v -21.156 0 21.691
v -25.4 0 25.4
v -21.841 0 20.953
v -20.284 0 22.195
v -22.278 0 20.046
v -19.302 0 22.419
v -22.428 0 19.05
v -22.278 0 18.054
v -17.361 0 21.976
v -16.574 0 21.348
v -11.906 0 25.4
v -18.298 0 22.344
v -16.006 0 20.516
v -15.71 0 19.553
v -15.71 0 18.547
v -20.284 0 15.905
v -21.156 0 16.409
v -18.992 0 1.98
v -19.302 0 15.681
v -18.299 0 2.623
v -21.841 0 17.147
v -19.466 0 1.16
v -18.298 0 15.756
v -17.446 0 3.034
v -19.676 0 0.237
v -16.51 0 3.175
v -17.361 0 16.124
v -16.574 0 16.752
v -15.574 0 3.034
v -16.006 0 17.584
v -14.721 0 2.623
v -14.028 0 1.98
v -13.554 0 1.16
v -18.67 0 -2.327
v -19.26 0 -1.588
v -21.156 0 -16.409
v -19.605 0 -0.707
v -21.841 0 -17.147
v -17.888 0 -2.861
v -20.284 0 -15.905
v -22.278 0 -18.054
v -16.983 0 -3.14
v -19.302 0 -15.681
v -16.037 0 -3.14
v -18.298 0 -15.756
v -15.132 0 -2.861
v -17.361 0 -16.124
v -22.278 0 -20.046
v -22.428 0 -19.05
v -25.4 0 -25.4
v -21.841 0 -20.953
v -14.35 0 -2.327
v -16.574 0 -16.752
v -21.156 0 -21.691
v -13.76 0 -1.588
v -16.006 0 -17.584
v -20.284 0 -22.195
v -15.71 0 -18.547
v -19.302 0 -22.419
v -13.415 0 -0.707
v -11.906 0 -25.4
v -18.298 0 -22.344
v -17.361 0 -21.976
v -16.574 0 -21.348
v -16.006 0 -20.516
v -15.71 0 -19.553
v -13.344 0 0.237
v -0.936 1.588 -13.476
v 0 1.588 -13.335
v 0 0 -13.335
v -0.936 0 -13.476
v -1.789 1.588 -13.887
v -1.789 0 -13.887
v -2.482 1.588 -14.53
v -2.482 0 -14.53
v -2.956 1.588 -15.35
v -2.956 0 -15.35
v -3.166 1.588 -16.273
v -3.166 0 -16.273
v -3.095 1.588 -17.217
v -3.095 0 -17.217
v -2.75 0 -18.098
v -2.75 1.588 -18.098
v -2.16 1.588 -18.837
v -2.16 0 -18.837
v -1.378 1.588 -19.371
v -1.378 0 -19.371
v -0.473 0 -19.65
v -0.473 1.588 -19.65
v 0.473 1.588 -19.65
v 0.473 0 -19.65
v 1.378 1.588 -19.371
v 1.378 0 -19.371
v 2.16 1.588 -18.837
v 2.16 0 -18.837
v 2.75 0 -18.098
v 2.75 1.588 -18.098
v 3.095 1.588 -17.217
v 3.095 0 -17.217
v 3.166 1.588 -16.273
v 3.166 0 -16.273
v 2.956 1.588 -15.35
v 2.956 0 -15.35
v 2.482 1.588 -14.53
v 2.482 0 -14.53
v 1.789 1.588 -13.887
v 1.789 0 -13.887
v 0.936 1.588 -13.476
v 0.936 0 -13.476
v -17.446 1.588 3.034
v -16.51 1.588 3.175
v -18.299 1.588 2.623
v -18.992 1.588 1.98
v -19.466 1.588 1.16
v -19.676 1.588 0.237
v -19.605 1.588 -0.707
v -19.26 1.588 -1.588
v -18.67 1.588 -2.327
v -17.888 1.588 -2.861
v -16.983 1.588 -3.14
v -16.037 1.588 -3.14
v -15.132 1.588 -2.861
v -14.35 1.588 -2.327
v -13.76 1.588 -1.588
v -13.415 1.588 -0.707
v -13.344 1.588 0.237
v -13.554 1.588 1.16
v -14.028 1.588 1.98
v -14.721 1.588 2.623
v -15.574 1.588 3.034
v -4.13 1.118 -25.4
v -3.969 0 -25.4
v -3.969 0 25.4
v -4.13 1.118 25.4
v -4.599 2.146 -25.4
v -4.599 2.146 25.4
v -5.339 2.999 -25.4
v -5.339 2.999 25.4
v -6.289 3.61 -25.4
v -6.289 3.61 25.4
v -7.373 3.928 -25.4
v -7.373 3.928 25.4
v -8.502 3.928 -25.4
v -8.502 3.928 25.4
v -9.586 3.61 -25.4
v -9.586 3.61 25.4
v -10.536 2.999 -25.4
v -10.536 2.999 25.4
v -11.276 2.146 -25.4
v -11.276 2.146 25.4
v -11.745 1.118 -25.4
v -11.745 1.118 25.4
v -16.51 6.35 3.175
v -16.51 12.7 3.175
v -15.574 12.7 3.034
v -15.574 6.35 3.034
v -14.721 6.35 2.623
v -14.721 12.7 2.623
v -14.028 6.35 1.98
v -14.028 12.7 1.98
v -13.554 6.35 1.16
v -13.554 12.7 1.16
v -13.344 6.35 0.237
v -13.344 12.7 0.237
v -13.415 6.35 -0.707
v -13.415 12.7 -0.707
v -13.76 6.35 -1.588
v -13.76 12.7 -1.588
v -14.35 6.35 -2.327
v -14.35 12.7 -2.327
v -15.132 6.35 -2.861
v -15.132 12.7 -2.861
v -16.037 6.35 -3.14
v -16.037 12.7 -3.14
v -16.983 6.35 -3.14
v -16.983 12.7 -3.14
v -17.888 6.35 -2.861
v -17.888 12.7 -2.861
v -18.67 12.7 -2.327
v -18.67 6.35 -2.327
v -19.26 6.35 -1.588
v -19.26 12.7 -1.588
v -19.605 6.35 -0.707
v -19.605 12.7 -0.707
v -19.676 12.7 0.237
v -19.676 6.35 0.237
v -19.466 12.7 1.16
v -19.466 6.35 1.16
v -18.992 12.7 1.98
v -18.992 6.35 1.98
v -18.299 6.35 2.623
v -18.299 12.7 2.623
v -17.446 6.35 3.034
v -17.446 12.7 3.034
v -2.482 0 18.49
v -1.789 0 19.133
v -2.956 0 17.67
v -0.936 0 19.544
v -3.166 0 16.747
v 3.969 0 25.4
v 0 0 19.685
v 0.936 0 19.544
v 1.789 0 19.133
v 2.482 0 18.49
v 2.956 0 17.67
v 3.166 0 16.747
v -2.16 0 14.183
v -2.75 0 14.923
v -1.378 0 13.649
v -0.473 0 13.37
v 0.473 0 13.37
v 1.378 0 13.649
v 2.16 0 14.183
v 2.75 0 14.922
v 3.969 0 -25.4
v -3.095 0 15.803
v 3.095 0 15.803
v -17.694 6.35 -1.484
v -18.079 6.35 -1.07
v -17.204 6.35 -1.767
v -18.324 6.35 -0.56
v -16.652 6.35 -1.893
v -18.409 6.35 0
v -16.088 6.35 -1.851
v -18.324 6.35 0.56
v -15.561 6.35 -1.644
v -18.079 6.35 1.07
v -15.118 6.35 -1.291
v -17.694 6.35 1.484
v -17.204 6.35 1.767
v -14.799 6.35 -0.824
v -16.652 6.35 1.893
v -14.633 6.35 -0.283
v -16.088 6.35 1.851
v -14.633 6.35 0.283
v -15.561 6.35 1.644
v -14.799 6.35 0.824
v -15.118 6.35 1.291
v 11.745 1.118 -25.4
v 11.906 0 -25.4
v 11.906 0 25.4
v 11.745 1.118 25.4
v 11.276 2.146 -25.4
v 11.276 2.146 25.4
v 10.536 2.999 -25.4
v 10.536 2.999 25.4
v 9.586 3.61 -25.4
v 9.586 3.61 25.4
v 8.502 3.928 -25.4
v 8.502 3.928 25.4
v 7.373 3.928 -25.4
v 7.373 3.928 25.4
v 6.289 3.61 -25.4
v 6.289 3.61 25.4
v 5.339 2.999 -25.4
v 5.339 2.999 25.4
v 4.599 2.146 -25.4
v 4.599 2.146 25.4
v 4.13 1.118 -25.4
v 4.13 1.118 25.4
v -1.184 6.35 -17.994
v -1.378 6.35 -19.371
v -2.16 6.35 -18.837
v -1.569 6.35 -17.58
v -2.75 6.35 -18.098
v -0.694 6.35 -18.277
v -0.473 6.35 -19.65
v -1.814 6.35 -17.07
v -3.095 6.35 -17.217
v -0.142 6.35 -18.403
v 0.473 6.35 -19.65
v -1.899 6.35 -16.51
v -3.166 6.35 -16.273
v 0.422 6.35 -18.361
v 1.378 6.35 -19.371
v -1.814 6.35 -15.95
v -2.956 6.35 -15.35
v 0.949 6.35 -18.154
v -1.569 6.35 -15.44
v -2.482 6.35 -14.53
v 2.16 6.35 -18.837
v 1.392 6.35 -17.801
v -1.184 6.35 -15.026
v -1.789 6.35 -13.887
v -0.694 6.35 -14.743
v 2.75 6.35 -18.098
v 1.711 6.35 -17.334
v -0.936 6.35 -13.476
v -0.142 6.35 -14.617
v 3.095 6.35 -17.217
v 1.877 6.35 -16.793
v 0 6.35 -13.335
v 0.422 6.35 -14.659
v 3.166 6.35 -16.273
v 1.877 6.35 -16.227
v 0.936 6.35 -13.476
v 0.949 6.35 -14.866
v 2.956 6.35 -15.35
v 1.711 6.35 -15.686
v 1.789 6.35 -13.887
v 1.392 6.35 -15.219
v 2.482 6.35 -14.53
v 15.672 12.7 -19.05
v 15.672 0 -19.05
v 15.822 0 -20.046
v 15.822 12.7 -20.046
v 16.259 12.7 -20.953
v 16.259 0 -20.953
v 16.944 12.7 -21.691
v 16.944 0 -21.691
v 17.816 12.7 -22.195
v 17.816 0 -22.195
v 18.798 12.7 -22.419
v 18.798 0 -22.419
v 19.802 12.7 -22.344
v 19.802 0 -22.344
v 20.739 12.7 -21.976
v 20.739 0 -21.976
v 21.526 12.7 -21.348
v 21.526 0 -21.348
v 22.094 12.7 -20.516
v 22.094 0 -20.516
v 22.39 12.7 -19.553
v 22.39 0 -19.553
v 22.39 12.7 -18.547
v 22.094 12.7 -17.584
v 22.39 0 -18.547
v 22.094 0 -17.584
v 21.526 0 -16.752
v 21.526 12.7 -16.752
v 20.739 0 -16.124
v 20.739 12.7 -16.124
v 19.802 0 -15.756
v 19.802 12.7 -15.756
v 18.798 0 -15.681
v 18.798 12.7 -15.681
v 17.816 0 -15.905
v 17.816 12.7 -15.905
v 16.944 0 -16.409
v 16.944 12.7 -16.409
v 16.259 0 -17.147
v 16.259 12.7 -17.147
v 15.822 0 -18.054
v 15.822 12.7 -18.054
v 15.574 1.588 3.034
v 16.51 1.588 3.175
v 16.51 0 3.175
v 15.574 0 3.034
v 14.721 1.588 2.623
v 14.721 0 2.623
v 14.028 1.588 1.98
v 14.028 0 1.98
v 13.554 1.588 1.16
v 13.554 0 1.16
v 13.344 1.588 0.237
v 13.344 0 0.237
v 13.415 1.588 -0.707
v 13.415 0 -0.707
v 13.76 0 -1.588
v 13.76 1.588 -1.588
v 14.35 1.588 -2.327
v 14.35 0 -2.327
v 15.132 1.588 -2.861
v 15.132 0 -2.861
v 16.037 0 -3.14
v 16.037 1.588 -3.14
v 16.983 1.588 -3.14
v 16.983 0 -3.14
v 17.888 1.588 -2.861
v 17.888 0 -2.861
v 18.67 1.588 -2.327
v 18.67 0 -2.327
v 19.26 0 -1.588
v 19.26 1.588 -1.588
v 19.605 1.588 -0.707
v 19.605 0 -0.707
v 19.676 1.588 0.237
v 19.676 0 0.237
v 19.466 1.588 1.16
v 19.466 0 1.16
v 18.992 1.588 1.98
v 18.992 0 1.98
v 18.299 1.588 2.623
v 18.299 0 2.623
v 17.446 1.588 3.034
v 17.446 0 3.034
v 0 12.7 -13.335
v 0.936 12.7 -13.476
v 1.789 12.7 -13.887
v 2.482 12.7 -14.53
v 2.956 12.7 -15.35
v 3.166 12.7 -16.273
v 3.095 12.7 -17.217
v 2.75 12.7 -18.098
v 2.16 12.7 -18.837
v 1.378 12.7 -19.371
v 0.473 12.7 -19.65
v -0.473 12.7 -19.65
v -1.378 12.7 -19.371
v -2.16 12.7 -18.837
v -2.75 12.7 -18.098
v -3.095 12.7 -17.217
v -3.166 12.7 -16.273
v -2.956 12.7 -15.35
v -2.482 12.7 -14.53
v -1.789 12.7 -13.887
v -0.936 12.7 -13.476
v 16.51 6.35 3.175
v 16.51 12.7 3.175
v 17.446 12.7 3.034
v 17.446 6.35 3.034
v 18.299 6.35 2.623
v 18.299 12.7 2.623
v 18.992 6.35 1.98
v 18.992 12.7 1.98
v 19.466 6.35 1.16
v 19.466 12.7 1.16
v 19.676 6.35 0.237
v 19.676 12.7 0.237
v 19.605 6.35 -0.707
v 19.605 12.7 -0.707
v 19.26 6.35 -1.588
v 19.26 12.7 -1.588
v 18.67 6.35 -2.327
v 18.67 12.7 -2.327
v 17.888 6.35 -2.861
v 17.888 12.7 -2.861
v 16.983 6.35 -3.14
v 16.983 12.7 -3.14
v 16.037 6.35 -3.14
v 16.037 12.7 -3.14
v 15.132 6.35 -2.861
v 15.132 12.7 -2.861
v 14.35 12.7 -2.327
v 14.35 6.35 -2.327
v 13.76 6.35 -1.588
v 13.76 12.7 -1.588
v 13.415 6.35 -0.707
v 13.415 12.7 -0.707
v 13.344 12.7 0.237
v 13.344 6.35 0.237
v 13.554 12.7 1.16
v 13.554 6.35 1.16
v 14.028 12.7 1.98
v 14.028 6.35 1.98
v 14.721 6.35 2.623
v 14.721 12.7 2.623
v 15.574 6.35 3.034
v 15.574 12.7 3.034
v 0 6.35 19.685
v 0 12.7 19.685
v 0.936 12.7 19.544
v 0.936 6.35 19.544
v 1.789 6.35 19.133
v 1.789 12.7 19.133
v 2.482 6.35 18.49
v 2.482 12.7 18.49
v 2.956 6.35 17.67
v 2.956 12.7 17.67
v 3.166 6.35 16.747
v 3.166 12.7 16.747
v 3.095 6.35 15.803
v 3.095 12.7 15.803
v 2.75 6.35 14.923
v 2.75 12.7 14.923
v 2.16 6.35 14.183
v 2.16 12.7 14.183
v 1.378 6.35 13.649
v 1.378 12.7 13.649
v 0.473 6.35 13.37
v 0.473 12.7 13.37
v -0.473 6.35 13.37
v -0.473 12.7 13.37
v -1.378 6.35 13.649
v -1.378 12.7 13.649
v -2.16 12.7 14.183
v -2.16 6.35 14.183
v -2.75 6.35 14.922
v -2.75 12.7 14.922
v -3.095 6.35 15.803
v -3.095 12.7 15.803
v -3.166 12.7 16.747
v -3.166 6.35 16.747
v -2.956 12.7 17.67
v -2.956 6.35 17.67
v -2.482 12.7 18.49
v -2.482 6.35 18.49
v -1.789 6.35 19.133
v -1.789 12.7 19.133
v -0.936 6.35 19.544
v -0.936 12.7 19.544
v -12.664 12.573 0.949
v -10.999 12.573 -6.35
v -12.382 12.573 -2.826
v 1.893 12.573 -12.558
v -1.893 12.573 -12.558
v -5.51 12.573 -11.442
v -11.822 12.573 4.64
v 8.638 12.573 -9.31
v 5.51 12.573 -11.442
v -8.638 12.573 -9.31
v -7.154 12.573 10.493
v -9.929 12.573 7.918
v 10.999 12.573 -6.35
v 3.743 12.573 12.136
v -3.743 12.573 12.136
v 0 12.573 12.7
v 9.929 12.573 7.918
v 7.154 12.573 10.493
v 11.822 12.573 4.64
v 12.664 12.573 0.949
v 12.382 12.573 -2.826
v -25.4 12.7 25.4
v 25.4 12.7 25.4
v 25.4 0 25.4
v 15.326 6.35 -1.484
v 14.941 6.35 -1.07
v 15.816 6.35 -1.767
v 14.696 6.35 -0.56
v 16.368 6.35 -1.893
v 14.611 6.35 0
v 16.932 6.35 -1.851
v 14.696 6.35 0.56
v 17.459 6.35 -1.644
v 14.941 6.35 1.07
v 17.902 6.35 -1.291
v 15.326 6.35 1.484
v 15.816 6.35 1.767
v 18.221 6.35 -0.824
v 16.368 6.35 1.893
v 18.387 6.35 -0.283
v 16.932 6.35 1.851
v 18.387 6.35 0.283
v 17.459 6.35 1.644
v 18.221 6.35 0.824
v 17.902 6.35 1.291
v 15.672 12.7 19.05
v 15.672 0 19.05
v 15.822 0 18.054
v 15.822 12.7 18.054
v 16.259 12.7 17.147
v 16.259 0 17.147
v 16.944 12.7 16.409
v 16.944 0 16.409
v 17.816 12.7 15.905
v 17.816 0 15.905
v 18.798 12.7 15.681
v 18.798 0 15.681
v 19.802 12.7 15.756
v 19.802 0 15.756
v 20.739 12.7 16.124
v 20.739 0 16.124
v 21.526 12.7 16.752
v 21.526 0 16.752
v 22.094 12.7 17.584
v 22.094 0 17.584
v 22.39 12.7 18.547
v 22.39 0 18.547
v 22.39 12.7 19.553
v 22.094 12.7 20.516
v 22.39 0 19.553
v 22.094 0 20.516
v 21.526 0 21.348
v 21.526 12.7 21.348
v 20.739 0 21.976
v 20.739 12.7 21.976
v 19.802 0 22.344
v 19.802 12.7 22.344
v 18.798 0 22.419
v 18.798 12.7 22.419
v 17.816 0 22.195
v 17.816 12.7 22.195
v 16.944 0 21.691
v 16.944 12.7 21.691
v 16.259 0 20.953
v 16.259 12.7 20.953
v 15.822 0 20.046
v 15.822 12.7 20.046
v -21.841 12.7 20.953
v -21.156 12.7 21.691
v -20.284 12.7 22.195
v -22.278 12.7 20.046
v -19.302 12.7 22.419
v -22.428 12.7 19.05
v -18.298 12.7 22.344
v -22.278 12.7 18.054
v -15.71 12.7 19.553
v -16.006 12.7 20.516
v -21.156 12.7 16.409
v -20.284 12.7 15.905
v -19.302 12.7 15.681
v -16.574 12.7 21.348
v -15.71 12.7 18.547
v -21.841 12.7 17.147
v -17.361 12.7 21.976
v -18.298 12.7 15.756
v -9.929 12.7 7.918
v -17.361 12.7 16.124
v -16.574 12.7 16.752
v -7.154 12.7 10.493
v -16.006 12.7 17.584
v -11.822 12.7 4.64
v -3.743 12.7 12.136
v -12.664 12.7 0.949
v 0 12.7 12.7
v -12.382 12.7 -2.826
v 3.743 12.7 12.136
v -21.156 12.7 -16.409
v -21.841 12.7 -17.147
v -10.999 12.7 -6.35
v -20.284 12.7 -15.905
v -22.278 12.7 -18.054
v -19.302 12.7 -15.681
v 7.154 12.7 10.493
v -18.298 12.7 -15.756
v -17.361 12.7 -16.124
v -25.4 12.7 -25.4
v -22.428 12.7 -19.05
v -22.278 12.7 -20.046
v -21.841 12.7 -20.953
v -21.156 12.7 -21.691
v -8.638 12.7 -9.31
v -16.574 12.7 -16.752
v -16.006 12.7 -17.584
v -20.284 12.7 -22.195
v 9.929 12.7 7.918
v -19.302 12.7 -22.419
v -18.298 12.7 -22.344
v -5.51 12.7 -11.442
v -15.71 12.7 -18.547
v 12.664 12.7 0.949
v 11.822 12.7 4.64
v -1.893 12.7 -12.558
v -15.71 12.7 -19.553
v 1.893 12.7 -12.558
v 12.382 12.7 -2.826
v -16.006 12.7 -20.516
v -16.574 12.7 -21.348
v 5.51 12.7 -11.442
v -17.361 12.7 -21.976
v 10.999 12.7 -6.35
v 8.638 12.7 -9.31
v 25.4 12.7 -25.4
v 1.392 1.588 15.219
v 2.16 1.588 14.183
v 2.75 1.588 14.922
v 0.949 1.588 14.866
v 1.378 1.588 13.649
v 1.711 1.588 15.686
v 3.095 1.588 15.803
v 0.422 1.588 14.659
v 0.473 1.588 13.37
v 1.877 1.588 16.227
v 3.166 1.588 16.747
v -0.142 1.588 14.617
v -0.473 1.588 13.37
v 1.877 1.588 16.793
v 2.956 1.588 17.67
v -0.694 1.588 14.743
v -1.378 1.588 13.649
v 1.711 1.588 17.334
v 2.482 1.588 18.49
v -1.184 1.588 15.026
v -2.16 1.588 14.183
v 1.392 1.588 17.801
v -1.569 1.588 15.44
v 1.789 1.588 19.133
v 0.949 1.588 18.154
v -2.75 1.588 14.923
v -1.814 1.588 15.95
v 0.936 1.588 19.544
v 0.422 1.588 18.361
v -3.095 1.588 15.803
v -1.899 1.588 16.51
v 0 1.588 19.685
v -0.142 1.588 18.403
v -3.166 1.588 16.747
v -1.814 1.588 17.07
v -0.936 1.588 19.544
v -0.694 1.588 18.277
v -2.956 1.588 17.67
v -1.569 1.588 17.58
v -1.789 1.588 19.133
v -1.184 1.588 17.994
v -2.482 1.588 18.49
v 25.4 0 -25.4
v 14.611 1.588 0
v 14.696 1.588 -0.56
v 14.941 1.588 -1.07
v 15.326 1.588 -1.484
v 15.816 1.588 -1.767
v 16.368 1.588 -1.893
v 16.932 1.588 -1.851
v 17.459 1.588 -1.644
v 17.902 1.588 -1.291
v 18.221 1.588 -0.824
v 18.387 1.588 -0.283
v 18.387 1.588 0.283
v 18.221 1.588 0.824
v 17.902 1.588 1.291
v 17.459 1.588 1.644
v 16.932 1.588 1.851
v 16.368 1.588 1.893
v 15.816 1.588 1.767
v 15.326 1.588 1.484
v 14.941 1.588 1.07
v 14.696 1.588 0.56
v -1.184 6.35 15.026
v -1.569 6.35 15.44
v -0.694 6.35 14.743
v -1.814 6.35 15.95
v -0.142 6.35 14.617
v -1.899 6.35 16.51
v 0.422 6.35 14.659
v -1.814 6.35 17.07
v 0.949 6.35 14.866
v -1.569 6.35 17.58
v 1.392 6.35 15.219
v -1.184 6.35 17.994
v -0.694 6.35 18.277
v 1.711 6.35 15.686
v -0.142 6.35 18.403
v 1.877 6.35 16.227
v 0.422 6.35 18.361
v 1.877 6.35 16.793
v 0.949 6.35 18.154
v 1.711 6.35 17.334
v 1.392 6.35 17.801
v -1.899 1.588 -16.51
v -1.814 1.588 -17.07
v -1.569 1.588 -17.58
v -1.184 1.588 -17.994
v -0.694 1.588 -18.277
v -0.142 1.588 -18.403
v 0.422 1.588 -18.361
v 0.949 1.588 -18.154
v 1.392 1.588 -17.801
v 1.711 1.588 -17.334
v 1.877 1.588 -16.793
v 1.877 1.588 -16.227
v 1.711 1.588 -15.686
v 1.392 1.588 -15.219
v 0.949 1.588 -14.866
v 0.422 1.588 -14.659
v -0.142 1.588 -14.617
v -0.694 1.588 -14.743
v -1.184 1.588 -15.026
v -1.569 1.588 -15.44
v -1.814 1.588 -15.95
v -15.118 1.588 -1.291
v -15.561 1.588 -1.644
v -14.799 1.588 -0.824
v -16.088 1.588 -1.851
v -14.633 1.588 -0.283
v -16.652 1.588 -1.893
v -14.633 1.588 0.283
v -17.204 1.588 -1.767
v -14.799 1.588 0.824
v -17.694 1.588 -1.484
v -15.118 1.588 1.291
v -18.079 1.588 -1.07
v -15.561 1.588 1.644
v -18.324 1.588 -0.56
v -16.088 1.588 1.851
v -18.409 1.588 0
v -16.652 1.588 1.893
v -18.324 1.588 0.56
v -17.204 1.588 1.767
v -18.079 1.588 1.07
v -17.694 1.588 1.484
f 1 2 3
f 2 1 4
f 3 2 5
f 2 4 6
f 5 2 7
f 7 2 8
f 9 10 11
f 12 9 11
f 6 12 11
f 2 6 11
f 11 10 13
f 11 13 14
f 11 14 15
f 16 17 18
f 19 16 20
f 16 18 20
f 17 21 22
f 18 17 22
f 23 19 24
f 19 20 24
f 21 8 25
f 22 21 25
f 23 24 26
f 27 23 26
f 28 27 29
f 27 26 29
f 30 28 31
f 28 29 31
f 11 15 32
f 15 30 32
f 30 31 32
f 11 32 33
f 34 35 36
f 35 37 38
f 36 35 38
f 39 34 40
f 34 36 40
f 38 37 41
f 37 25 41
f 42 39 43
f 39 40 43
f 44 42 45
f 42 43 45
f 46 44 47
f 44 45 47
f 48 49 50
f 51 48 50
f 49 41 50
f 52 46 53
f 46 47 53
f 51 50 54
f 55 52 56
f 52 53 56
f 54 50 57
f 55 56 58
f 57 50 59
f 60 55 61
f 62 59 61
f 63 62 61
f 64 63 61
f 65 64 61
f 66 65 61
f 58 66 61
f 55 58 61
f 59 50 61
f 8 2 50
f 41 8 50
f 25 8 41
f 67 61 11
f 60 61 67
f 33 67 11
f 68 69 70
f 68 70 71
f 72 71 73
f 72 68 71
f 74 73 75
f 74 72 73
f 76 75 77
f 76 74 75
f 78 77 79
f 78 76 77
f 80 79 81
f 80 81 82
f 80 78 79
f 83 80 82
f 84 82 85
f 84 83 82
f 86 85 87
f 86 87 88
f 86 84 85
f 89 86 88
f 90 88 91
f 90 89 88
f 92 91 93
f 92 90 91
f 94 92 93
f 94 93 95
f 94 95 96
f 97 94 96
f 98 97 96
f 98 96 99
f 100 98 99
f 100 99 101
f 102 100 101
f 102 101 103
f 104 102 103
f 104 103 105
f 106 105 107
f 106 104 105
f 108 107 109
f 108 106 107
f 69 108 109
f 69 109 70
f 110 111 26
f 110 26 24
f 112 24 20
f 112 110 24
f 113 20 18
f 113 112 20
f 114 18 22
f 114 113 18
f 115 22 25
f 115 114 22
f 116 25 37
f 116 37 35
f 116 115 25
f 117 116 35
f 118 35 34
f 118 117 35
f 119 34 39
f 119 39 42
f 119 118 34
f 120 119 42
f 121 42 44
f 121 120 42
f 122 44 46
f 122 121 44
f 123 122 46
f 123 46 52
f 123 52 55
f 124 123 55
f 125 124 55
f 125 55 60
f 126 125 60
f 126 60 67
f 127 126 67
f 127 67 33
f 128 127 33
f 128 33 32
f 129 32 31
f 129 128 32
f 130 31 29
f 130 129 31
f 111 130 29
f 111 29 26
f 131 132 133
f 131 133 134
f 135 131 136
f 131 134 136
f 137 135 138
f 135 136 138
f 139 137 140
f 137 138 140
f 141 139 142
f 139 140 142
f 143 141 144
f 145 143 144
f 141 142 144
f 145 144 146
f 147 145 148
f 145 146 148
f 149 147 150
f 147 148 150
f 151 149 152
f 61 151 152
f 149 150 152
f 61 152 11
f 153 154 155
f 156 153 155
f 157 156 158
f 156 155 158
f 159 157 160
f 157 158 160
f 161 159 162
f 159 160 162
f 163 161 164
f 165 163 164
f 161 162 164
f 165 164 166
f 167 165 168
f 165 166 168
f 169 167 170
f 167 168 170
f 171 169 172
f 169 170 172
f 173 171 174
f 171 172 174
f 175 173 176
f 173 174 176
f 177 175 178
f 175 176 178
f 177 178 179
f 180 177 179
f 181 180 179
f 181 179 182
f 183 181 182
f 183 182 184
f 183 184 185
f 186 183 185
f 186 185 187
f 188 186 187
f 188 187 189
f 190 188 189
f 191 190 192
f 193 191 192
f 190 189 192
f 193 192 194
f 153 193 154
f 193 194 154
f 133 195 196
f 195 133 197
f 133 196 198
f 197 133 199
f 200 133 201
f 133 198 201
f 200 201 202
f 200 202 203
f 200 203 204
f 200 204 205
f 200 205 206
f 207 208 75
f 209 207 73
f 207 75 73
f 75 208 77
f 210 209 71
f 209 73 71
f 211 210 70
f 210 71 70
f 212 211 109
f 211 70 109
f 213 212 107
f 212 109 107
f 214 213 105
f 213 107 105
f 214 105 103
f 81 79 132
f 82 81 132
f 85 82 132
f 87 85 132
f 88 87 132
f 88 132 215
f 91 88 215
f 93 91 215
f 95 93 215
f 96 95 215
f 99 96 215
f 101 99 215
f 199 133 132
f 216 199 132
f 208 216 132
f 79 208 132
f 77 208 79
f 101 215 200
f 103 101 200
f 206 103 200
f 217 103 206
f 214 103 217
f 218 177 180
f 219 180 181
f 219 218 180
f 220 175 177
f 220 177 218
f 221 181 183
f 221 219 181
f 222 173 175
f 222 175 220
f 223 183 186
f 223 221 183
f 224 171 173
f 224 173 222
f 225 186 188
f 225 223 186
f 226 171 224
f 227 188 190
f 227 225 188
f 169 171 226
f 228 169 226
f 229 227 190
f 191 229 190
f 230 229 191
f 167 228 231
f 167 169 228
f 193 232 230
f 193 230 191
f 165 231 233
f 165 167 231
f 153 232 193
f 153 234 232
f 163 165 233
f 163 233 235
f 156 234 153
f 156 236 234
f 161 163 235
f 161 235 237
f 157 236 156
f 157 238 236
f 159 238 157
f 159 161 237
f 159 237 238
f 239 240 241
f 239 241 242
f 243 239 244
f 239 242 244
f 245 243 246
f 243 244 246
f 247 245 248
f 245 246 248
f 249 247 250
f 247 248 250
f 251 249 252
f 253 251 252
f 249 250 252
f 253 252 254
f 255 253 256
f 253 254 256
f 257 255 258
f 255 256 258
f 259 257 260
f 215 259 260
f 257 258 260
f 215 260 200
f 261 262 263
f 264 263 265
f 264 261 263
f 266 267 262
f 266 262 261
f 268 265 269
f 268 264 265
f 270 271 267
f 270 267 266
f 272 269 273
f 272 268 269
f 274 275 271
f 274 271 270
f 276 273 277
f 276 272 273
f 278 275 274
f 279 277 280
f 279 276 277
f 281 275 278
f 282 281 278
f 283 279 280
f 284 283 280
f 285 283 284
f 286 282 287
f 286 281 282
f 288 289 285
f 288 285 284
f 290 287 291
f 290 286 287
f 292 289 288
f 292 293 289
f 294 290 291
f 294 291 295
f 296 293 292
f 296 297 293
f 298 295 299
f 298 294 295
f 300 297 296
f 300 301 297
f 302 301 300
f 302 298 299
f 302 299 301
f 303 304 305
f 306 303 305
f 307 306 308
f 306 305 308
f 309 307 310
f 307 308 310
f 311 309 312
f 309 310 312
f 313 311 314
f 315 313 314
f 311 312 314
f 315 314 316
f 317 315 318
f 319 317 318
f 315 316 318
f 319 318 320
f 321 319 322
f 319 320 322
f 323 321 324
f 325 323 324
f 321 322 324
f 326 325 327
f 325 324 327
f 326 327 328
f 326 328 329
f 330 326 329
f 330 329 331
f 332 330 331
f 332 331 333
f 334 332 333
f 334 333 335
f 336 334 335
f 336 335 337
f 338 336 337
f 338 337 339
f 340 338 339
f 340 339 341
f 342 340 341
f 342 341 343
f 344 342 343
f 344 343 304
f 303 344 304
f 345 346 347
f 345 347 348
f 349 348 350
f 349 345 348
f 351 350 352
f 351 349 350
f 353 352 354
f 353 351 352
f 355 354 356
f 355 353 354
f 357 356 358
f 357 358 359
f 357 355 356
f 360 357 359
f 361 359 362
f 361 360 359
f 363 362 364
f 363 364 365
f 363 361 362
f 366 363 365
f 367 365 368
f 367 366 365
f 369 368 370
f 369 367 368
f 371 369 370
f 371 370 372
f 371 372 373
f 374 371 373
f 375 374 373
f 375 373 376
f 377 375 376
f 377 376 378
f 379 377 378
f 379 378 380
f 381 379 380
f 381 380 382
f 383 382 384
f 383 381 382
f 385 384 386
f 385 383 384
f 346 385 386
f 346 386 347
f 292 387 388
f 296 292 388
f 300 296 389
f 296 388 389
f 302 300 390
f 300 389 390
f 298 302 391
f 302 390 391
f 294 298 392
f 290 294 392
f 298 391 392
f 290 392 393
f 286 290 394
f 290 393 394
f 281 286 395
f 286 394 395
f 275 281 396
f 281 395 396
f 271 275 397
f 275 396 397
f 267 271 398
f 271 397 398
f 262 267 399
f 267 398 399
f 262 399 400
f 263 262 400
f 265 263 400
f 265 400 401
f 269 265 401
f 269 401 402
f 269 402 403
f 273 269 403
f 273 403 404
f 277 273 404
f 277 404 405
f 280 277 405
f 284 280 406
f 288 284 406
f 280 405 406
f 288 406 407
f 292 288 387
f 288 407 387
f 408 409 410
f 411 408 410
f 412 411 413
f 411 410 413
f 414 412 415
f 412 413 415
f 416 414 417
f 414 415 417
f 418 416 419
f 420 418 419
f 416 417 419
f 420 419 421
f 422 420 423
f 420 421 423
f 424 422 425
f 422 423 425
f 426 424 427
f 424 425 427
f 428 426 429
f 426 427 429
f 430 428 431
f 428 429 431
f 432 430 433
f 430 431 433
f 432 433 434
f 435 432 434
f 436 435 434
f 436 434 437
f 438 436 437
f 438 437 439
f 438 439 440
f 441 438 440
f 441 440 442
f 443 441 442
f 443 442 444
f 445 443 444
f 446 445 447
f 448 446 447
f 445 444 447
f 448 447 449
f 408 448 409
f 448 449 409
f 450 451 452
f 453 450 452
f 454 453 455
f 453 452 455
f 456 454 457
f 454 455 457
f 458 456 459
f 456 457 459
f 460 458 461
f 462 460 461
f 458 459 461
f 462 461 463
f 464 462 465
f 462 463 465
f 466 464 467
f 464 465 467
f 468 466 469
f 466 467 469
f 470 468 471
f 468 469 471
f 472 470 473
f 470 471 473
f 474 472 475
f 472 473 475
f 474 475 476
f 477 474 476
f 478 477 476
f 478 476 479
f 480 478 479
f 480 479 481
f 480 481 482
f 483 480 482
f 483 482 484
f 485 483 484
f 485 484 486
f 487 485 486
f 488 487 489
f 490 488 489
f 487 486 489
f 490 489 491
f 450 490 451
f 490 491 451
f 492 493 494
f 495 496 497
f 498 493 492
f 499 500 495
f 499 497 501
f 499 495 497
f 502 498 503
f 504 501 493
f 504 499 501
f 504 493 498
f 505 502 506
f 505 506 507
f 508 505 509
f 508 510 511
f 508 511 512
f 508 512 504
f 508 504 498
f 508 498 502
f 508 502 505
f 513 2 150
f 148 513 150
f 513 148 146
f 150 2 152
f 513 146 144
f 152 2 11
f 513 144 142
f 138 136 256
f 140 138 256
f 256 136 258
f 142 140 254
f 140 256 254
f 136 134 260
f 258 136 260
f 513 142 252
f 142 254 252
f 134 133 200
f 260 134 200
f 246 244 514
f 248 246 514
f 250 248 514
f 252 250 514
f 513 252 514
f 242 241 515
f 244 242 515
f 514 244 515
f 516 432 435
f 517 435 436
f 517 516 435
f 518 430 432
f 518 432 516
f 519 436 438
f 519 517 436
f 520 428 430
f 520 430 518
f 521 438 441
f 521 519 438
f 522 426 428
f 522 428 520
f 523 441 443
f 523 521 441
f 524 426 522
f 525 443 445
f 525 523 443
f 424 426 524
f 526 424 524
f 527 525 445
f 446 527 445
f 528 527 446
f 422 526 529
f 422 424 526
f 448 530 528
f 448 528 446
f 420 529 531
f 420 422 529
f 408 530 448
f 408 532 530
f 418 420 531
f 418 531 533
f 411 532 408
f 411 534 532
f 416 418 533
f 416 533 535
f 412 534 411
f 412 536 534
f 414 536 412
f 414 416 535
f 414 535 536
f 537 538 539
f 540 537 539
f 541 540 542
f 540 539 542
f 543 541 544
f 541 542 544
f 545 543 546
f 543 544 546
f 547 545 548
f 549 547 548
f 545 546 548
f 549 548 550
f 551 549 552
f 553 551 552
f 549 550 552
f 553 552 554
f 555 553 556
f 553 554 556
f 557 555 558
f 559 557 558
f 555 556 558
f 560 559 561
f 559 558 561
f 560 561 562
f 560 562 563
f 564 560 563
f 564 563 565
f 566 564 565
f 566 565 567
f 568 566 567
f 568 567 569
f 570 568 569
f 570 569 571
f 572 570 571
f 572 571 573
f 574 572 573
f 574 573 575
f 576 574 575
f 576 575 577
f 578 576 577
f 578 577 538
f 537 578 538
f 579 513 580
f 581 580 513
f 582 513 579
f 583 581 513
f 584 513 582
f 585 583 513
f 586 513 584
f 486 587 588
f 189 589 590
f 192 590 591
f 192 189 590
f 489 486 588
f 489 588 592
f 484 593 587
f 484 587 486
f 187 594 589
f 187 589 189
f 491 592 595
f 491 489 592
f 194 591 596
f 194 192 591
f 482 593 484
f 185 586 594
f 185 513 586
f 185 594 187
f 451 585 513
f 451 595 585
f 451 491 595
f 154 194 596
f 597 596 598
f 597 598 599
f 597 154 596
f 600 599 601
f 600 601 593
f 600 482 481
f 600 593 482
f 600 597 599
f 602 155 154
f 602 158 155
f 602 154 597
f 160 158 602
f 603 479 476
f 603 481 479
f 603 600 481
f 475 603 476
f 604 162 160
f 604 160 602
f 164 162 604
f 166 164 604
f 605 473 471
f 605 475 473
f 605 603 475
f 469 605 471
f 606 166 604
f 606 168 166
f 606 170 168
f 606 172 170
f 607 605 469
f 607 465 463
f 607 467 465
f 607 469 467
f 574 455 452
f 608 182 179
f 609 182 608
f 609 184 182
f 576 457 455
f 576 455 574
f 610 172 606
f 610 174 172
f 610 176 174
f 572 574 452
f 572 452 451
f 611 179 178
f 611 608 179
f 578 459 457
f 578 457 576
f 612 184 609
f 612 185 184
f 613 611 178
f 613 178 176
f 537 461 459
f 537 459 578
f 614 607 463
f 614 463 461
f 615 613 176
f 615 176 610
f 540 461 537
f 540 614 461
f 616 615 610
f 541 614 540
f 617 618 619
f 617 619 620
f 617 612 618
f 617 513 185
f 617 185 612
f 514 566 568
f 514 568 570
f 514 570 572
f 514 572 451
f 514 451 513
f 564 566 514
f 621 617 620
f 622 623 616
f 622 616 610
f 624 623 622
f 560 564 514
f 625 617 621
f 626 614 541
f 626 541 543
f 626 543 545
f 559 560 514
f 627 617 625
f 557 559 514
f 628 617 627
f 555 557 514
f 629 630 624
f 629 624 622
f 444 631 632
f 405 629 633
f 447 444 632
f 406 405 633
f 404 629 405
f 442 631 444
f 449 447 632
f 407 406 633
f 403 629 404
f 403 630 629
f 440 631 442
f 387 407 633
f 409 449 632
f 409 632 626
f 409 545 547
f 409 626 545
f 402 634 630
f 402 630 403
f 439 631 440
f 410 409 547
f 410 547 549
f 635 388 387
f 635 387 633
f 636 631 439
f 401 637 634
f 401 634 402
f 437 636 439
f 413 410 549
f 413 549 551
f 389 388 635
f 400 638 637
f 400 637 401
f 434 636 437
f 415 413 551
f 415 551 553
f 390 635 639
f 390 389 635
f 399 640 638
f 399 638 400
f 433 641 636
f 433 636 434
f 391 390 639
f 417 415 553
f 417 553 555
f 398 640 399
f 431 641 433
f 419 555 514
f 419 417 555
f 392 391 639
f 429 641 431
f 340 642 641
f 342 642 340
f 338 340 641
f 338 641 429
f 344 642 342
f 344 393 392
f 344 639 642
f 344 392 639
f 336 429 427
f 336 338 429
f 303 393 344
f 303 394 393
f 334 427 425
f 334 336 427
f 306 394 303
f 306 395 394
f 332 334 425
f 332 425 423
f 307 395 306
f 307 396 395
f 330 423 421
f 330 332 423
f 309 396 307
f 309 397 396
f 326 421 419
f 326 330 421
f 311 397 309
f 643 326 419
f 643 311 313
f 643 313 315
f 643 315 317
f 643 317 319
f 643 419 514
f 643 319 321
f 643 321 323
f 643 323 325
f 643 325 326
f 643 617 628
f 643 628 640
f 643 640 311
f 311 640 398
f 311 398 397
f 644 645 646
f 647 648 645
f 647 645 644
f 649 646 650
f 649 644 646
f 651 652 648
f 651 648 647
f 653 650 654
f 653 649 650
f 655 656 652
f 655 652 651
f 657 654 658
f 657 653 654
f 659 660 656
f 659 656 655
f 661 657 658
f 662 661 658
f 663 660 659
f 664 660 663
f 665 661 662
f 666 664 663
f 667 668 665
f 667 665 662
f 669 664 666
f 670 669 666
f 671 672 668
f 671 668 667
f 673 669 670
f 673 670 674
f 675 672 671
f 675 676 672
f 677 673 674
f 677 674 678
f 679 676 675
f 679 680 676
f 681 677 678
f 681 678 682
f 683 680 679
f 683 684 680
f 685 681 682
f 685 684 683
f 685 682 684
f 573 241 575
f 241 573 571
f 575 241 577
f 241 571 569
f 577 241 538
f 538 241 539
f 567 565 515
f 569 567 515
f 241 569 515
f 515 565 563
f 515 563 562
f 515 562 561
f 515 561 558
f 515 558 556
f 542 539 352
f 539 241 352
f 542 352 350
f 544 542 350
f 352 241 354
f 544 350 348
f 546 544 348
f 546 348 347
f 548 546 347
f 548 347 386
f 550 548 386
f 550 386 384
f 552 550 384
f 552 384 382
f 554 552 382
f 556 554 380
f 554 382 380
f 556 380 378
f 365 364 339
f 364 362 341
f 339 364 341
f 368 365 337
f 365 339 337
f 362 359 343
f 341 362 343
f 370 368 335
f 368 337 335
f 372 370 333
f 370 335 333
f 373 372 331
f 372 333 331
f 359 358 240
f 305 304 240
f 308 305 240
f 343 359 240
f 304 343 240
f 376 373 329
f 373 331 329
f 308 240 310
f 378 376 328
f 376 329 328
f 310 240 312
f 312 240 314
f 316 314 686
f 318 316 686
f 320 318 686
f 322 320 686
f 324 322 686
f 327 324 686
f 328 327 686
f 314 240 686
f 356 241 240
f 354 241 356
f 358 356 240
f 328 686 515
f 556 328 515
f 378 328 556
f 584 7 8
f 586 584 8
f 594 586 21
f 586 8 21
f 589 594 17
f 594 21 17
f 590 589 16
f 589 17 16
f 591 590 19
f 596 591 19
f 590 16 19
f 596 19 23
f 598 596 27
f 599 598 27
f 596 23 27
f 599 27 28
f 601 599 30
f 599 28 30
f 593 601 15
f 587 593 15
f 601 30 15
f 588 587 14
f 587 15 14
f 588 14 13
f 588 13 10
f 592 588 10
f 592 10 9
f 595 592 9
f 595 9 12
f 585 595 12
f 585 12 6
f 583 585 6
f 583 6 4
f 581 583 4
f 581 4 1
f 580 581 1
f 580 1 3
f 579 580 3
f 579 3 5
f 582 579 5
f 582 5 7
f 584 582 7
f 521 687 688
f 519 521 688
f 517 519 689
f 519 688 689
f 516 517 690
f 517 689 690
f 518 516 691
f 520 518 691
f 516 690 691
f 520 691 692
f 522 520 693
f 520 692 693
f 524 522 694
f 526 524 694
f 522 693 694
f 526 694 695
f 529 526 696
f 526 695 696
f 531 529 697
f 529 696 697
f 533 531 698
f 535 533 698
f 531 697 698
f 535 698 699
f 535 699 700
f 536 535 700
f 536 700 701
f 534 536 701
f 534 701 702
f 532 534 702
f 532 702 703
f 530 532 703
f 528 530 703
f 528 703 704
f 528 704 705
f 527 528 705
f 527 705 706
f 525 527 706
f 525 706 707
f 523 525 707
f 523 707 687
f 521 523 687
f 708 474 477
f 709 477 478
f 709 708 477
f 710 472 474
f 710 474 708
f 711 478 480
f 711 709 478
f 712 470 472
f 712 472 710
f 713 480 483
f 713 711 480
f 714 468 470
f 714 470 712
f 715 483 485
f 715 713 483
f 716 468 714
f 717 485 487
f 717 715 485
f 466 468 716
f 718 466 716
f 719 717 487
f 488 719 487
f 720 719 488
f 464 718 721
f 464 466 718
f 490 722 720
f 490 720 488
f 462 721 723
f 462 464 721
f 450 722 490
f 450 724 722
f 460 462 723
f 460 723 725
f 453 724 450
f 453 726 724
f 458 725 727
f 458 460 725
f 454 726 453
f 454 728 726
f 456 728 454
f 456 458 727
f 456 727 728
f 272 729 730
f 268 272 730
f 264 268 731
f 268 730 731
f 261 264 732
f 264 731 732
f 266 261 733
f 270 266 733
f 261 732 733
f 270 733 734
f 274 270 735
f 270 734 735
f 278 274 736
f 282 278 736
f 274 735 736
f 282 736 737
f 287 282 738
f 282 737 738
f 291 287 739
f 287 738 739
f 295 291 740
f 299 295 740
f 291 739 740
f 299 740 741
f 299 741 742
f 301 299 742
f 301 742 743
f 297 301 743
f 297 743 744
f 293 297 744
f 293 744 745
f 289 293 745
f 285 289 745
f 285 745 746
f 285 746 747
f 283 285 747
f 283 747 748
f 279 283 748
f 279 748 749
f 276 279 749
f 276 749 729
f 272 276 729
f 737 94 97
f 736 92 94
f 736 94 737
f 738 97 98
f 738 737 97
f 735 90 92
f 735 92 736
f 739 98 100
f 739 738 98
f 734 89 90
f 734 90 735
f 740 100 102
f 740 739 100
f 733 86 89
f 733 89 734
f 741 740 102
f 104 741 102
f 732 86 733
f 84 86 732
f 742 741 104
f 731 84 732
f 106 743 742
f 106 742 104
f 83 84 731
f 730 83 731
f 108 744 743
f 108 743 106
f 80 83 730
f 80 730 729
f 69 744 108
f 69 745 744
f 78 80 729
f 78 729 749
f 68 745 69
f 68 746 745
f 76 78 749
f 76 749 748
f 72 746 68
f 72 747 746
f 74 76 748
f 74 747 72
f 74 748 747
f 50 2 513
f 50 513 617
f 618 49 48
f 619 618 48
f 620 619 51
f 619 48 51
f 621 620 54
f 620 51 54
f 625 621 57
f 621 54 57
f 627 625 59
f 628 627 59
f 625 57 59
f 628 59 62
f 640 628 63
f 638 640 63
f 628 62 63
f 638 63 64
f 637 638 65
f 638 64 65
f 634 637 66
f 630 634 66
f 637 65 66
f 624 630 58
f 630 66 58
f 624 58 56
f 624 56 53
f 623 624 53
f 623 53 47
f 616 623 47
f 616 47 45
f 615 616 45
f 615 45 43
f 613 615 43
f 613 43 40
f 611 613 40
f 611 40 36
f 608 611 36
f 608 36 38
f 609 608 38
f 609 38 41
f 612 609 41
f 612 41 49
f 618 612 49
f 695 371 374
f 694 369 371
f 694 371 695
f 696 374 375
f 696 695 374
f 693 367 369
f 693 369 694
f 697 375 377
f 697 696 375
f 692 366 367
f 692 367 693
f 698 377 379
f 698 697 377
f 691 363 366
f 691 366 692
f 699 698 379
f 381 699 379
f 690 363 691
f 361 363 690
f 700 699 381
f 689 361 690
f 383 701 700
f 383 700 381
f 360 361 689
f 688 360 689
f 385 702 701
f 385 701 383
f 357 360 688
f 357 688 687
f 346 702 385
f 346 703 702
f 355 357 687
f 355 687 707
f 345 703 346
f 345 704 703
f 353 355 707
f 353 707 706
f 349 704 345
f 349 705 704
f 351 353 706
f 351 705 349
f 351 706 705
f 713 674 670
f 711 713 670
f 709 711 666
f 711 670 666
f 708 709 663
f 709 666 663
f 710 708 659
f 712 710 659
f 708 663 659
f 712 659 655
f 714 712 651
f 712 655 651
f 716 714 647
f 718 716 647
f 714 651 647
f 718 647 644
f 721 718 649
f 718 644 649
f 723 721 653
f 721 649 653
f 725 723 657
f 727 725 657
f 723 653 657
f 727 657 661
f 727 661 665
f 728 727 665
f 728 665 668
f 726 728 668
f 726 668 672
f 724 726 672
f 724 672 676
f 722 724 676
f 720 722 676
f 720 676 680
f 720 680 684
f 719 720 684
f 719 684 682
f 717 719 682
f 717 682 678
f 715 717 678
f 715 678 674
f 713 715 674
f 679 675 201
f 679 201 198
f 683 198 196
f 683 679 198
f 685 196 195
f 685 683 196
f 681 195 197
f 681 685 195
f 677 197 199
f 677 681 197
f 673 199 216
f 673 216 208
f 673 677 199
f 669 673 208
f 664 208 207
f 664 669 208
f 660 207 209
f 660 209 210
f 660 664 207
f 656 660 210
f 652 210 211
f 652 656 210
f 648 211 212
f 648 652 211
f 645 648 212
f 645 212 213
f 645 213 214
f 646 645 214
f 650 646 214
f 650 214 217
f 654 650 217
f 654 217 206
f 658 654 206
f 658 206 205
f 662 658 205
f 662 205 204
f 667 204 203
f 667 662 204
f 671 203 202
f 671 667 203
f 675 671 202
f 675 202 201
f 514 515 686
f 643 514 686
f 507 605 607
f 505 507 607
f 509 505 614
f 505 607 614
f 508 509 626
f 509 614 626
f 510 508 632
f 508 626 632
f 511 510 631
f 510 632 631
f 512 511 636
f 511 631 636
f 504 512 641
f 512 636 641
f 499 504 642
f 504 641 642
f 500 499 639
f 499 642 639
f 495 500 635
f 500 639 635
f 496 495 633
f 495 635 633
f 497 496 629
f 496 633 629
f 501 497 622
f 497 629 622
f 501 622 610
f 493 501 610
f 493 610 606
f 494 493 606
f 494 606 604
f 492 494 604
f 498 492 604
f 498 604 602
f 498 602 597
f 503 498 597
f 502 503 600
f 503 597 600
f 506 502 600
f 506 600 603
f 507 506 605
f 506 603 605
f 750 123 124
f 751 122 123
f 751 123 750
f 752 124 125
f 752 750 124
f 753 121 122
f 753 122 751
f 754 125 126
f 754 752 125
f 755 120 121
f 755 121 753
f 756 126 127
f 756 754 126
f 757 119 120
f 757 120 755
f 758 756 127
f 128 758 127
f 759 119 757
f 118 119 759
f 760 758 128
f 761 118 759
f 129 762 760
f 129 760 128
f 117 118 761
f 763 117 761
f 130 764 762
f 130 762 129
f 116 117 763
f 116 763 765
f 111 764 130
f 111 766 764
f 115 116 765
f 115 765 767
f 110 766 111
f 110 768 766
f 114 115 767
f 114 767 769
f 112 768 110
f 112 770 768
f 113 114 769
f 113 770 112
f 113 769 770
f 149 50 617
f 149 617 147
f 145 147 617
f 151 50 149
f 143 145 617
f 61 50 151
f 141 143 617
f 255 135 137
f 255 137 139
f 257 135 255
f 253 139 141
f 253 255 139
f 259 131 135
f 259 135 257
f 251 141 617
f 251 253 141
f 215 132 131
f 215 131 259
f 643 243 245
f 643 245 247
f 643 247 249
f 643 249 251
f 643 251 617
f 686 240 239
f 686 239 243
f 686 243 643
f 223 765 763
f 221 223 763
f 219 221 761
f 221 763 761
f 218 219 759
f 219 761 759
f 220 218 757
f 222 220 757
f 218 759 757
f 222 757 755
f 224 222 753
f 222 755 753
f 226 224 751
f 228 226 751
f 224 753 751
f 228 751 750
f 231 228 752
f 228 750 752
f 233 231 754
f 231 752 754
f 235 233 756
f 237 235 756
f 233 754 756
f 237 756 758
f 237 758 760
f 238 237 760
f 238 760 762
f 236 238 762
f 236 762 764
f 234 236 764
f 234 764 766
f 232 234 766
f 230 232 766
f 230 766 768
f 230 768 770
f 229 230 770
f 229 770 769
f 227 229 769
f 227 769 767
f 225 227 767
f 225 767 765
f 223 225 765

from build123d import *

# Parameters (mm, degrees)
SKETCH1_W               = 50.8
SKETCH1_H               = 50.8
BOSS_EXTRUDE1_DEPTH     = 12.7
SKETCH2_R               = 3.96875
CUT_EXTRUDE1_DEPTH      = 59.198711326
F_1_4_CLEARANCE_HOLE1_D = 6.7564
SKETCH7_R               = 3.175
CUT_EXTRUDE2_DEPTH      = 6.35
F_6_CLEARANCE_HOLE1_D   = 3.7973
CUT_EXTRUDE5_START      = -1.5875
SKETCH15_R              = 3.175
CUT_EXTRUDE5_DEPTH      = 1.5875
SKETCH16_R              = 12.7
CUT_EXTRUDE6_DEPTH      = 0.127


with BuildPart() as part:
    # Sketch1 → Boss-Extrude1 (new body)
    with BuildSketch(Plane(origin=(0, 0, 0), x_dir=(1, 0, 0), z_dir=(0, 1, 0))):
        Rectangle(SKETCH1_W, SKETCH1_H)
    extrude(amount=BOSS_EXTRUDE1_DEPTH)

    # Sketch2 → Cut-Extrude1 (cut, through all)
    with BuildSketch(Plane.XY.offset(25.4)):
        with Locations((-7.9375, 0)):
            Circle(SKETCH2_R)
        with Locations((7.9375, 0)):
            Circle(SKETCH2_R)
    extrude(amount=-CUT_EXTRUDE1_DEPTH, mode=Mode.SUBTRACT)

    # 1/4 Clearance Hole1 (through all)
    with Locations(Plane(origin=(0, 12.7, 0), x_dir=(1, 0, 0), z_dir=(0, 1, 0))):
        with Locations((-19.05, -19.05), (-19.05, 19.05), (19.05, 19.05), (19.05, -19.05)):
            Hole(F_1_4_CLEARANCE_HOLE1_D / 2)

    # Sketch7 → Cut-Extrude2 (cut)
    with BuildSketch(Plane(origin=(0, 12.7, 0), x_dir=(1, 0, 0), z_dir=(0, 1, 0))):
        with Locations(Location((-16.51, 0, 0), (0, 0, 270))):
            Circle(SKETCH7_R)
        with Locations(Location((0, 16.51, 0), (0, 0, 270))):
            Circle(SKETCH7_R)
        with Locations(Location((16.51, 0, 0), (0, 0, 270))):
            Circle(SKETCH7_R)
        with Locations(Location((0, -16.51, 0), (0, 0, 270))):
            Circle(SKETCH7_R)
    extrude(amount=-CUT_EXTRUDE2_DEPTH, mode=Mode.SUBTRACT)

    # #6 Clearance Hole1 (through all)
    with Locations(Plane(origin=(0, 6.35, 0), x_dir=(1, 0, 0), z_dir=(0, 1, 0))):
        with Locations((-16.51, 0), (0, 16.51), (16.51, 0), (0, -16.51)):
            Hole(F_6_CLEARANCE_HOLE1_D / 2)

    # Sketch15 → Cut-Extrude5 (cut)
    with BuildSketch(Plane.XZ.offset(CUT_EXTRUDE5_START)):
        with Locations(Location((0, 16.51, 0), (0, 0, 90))):
            Circle(SKETCH15_R)
        with Locations(Location((16.51, 0, 0), (0, 0, 90))):
            Circle(SKETCH15_R)
        with Locations(Location((0, -16.51, 0), (0, 0, 90))):
            Circle(SKETCH15_R)
        with Locations(Location((-16.51, 0, 0), (0, 0, 90))):
            Circle(SKETCH15_R)
    extrude(amount=CUT_EXTRUDE5_DEPTH, mode=Mode.SUBTRACT)

    # Sketch16 → Cut-Extrude6 (cut)
    with BuildSketch(Plane(origin=(0, 12.7, 0), x_dir=(1, 0, 0), z_dir=(0, 1, 0))):
        with Locations(Location((0, 0, 0), (0, 0, 270))):
            Circle(SKETCH16_R)
    extrude(amount=-CUT_EXTRUDE6_DEPTH, mode=Mode.SUBTRACT)


solid = part.part
